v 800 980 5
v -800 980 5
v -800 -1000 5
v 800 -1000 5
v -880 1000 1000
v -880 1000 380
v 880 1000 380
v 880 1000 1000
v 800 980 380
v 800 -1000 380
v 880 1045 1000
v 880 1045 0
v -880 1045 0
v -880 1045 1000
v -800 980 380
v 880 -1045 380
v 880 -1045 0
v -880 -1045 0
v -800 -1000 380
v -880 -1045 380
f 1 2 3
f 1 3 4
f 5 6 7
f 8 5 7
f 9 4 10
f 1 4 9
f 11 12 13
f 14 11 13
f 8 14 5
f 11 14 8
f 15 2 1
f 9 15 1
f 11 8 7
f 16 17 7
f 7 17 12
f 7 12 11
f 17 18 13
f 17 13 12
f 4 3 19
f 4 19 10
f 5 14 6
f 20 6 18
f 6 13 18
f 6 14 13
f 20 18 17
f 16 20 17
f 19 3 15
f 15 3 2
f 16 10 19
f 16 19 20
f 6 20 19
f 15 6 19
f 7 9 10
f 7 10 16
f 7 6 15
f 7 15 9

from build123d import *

# Parameters (mm, degrees)
F0_W     = 1600
F0_H     = 1980
F1_DEPTH = 380
F2_DEPTH = 1000
F3_DEPTH = 5


with BuildPart() as f1:
    # F0 (on Top) → F1 (new body)
    with BuildSketch(Plane.XY):
        Polygon((-800, 1000), (-880, 1000), (-880, -1045), (880, -1045), (880, 1000), (800, 1000), align=None)
        with Locations((0, -10)):
            Rectangle(F0_W, F0_H, mode=Mode.SUBTRACT)
    extrude(amount=F1_DEPTH)

    # F0 (on Top) → F2 (join)
    with BuildSketch(Plane.XY):
        Polygon((880, 1045), (-880, 1045), (-880, 1000), (-800, 1000), (800, 1000), (880, 1000), align=None)
    extrude(amount=F2_DEPTH)

    # F0 (on Top) → F3 (join)
    with BuildSketch(Plane.XY):
        with Locations((0, -10)):
            Rectangle(F0_W, F0_H)
    extrude(amount=F3_DEPTH)


solid = f1.part
